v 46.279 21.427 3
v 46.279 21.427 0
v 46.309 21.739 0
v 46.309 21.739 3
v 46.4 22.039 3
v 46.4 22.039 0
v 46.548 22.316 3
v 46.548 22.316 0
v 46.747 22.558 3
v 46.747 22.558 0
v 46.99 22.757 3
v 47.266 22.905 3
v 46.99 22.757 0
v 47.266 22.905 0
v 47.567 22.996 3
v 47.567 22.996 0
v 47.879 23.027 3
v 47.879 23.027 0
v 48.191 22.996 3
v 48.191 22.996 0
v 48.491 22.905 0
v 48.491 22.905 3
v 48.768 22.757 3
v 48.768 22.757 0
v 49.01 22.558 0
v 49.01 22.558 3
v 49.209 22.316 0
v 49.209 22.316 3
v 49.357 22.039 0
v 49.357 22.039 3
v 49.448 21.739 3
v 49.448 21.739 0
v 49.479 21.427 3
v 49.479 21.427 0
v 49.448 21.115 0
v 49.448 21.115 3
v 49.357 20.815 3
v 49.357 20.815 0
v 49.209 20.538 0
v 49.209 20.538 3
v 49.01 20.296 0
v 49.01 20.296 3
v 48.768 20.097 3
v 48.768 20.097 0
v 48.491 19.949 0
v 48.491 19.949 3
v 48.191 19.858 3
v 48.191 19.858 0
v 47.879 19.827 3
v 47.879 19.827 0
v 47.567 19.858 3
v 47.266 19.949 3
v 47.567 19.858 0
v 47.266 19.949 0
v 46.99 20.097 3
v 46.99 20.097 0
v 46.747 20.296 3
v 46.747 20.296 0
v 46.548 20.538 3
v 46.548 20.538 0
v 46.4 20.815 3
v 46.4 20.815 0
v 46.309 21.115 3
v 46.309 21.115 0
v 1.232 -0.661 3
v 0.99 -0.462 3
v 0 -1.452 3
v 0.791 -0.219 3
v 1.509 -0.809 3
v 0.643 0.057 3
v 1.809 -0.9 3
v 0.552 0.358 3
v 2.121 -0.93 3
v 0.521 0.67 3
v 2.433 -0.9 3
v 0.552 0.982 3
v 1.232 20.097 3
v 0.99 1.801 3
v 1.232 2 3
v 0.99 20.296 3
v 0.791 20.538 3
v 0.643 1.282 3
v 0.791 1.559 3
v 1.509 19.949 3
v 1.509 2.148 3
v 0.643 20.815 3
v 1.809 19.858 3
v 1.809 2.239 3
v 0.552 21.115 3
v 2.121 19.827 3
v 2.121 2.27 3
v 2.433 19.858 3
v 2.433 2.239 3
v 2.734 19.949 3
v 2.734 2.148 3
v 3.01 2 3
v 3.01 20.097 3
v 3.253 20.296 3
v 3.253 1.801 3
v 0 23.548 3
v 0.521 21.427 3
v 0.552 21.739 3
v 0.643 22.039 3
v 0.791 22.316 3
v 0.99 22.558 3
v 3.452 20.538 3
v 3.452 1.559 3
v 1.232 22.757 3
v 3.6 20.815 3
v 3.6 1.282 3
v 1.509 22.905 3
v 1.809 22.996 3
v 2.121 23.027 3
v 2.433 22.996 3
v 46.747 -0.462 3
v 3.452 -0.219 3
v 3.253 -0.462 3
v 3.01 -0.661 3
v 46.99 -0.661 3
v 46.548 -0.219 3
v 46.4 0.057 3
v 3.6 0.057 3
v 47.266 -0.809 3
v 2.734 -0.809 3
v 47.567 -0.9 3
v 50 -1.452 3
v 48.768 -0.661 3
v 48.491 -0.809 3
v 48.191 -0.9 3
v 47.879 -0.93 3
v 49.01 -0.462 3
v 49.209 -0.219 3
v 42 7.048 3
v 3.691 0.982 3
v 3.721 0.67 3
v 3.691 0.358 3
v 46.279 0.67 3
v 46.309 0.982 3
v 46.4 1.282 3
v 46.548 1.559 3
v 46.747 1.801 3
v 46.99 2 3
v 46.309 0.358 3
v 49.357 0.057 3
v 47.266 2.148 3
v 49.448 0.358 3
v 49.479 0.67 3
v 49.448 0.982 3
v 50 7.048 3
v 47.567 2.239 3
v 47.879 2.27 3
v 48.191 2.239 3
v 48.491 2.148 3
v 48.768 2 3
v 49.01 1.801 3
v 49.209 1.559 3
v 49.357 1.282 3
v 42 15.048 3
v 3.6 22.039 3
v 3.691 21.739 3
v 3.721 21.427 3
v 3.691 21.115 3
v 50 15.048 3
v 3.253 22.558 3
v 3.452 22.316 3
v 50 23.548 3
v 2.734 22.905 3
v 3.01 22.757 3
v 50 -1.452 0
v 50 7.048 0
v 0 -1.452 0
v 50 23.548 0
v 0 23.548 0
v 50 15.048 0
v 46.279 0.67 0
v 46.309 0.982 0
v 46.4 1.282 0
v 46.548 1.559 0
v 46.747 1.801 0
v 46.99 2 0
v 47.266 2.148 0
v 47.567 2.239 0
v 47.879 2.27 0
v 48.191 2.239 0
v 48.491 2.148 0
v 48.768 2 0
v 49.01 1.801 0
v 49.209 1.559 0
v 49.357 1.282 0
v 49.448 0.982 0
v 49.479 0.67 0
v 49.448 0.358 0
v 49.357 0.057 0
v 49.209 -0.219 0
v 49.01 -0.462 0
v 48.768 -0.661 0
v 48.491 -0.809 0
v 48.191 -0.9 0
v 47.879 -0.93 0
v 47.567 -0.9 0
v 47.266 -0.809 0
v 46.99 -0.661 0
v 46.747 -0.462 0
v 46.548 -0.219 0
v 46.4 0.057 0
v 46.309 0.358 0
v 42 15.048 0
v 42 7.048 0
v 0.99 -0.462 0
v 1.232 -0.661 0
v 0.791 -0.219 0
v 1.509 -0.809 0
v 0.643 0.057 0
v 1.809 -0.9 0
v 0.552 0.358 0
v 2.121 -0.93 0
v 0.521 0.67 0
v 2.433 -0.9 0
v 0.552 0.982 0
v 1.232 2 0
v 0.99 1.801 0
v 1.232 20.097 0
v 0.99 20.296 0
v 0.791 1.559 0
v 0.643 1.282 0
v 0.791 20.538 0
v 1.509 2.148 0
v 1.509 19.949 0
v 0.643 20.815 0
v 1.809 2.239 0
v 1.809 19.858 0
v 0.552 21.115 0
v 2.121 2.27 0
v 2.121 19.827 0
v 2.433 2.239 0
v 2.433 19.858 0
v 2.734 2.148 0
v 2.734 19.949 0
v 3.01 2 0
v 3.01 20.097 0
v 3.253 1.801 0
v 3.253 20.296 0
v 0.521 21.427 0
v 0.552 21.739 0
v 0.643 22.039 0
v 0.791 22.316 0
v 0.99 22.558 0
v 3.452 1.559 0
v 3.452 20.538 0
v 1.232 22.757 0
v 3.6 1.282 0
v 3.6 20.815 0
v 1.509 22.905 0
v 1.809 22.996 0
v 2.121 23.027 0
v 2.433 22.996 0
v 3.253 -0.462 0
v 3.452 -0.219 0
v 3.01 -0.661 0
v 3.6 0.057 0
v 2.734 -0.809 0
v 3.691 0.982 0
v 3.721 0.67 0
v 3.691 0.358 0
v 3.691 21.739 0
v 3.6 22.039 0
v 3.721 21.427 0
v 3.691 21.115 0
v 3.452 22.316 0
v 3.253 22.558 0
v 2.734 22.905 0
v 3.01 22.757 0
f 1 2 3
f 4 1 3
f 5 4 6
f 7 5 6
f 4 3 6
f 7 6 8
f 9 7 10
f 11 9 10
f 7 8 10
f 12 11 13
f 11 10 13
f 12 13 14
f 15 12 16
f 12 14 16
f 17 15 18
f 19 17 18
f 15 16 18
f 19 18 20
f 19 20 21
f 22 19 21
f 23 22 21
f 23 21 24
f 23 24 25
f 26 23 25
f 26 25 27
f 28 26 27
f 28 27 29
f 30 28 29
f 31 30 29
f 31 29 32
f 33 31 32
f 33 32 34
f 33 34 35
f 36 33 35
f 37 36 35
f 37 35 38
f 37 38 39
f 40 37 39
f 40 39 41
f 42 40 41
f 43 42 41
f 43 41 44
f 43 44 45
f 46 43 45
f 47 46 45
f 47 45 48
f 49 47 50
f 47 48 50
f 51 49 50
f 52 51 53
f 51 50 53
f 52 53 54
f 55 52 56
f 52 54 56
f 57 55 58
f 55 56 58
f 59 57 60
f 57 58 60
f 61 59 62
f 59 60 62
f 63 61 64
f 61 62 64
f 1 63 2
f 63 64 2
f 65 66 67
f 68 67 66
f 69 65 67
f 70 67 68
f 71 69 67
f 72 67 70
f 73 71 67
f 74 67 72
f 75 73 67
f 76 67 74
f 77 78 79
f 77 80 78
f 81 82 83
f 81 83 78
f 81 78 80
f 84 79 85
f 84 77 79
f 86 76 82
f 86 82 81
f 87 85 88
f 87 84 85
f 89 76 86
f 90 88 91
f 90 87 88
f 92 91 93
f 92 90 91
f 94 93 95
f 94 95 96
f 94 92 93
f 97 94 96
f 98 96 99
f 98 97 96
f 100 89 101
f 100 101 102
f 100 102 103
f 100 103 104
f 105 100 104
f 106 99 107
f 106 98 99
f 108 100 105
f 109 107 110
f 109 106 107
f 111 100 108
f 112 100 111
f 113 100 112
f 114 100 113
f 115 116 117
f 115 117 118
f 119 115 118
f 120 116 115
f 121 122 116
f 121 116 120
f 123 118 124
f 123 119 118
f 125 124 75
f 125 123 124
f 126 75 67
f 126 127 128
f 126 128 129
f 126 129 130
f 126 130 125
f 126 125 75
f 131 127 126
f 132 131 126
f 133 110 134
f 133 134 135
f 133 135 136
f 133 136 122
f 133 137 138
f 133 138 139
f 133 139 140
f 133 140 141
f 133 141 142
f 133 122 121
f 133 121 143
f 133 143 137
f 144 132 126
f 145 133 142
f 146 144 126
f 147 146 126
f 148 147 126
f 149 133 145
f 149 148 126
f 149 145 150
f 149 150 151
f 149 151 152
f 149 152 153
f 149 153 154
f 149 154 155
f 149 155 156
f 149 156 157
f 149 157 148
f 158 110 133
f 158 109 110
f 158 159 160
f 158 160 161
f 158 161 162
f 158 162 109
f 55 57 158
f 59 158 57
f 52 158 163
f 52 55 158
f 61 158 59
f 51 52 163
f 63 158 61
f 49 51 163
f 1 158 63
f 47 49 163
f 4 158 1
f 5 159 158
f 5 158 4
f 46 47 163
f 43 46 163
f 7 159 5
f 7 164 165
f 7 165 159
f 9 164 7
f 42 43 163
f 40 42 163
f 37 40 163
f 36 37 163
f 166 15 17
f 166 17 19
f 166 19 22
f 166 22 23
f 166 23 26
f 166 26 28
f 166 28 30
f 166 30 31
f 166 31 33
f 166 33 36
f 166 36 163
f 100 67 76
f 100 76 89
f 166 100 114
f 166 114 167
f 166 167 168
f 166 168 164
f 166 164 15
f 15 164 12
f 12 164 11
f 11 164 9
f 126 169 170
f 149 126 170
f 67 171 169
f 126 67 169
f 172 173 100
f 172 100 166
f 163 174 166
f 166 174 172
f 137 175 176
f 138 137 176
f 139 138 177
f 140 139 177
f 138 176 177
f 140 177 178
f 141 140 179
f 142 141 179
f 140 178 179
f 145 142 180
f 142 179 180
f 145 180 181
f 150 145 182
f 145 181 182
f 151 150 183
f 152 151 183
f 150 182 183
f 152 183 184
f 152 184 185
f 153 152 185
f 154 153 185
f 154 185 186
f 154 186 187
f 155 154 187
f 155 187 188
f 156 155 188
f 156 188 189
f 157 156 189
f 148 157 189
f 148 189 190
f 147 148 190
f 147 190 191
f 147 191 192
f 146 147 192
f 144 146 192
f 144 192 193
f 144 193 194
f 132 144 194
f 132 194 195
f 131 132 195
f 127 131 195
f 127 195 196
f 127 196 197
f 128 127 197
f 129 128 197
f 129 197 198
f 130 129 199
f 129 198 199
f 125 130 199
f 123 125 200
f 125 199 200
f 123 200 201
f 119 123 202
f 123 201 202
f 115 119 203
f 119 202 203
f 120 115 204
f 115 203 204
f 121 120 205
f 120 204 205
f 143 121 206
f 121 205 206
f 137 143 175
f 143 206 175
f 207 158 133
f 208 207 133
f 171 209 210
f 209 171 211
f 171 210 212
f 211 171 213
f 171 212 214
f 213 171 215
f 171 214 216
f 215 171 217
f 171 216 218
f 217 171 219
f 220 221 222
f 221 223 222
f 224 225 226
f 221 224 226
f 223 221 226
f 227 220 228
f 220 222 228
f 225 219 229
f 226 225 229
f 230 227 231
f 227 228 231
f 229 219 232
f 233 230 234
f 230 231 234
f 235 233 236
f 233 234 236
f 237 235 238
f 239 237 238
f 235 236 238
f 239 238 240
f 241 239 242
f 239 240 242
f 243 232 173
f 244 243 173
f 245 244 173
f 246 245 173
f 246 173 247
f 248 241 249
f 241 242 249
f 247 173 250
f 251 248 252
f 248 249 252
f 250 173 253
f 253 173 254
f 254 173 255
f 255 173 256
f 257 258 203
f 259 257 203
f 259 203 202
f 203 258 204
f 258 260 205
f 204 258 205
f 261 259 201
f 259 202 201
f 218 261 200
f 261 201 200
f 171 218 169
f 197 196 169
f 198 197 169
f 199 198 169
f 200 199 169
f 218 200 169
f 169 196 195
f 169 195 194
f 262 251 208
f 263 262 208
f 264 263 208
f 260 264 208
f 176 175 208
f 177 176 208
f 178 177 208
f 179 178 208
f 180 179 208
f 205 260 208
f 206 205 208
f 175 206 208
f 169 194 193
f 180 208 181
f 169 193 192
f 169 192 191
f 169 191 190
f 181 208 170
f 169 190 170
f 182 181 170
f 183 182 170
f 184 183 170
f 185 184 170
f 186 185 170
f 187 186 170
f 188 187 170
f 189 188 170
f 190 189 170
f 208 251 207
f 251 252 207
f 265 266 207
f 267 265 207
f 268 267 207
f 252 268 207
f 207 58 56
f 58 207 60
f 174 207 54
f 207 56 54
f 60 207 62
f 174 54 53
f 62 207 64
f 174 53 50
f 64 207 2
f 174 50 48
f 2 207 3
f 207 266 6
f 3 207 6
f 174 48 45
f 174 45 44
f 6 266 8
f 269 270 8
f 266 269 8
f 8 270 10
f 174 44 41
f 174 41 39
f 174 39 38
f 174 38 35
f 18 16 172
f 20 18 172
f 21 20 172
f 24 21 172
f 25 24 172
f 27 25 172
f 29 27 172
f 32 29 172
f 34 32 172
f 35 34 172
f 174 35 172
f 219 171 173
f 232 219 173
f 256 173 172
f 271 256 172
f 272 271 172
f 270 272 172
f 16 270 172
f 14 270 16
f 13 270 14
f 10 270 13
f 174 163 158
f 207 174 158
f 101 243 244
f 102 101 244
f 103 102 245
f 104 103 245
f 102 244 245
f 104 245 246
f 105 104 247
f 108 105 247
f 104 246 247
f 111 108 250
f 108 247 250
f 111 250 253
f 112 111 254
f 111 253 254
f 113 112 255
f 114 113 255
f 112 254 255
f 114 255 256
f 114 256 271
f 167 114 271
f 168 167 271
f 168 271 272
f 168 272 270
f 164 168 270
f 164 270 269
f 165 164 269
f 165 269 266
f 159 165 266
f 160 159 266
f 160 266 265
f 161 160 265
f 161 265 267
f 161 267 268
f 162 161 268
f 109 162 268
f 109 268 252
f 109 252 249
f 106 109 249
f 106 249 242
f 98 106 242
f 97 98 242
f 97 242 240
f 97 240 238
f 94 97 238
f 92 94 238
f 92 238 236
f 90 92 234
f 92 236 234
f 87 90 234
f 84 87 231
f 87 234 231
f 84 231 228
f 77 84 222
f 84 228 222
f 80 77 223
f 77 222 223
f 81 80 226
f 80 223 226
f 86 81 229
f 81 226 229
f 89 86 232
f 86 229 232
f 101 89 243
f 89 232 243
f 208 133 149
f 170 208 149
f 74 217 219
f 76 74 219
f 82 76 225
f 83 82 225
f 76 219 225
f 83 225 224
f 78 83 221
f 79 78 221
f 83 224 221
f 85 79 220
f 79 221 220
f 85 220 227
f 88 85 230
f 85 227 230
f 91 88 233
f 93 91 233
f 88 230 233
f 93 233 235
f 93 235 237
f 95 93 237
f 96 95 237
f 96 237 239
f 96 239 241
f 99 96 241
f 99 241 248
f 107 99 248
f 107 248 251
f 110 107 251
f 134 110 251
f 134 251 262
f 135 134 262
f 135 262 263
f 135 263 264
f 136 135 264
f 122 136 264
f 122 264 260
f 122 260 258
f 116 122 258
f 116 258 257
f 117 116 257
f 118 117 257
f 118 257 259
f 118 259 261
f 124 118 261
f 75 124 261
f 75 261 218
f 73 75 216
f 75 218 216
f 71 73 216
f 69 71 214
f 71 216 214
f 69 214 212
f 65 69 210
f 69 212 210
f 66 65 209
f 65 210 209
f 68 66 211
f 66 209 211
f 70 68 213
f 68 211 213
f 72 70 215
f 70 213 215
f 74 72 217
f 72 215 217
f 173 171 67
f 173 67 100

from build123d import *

# Parameters (mm, degrees)
F0_W     = 50
F0_H     = 25
F1_DEPTH = 3
F3_D     = 3.2
F5_DEPTH = 25


with BuildPart() as f1:
    # F0 (on Top) → F1 (new body)
    with BuildSketch(Plane.XY):
        with Locations((25, 11.048387)):
            Rectangle(F0_W, F0_H)
    extrude(amount=F1_DEPTH)

    # F3 (through all)
    with Locations(Plane.XY.offset(3)):
        with Locations((2.12132, 21.427067), (47.87868, 21.427067), (47.87868, 0.669707), (2.12132, 0.669707)):
            Hole(F3_D / 2)

    # F4 (on face) → F5 (cut)
    with BuildSketch(Plane.XY.offset(3)):
        Polygon((50, 7.048387), (50, 11.048387), (50, 15.048387), (42, 15.048387), (42, 7.048387), align=None)
    extrude(amount=-F5_DEPTH, mode=Mode.SUBTRACT)


solid = f1.part
